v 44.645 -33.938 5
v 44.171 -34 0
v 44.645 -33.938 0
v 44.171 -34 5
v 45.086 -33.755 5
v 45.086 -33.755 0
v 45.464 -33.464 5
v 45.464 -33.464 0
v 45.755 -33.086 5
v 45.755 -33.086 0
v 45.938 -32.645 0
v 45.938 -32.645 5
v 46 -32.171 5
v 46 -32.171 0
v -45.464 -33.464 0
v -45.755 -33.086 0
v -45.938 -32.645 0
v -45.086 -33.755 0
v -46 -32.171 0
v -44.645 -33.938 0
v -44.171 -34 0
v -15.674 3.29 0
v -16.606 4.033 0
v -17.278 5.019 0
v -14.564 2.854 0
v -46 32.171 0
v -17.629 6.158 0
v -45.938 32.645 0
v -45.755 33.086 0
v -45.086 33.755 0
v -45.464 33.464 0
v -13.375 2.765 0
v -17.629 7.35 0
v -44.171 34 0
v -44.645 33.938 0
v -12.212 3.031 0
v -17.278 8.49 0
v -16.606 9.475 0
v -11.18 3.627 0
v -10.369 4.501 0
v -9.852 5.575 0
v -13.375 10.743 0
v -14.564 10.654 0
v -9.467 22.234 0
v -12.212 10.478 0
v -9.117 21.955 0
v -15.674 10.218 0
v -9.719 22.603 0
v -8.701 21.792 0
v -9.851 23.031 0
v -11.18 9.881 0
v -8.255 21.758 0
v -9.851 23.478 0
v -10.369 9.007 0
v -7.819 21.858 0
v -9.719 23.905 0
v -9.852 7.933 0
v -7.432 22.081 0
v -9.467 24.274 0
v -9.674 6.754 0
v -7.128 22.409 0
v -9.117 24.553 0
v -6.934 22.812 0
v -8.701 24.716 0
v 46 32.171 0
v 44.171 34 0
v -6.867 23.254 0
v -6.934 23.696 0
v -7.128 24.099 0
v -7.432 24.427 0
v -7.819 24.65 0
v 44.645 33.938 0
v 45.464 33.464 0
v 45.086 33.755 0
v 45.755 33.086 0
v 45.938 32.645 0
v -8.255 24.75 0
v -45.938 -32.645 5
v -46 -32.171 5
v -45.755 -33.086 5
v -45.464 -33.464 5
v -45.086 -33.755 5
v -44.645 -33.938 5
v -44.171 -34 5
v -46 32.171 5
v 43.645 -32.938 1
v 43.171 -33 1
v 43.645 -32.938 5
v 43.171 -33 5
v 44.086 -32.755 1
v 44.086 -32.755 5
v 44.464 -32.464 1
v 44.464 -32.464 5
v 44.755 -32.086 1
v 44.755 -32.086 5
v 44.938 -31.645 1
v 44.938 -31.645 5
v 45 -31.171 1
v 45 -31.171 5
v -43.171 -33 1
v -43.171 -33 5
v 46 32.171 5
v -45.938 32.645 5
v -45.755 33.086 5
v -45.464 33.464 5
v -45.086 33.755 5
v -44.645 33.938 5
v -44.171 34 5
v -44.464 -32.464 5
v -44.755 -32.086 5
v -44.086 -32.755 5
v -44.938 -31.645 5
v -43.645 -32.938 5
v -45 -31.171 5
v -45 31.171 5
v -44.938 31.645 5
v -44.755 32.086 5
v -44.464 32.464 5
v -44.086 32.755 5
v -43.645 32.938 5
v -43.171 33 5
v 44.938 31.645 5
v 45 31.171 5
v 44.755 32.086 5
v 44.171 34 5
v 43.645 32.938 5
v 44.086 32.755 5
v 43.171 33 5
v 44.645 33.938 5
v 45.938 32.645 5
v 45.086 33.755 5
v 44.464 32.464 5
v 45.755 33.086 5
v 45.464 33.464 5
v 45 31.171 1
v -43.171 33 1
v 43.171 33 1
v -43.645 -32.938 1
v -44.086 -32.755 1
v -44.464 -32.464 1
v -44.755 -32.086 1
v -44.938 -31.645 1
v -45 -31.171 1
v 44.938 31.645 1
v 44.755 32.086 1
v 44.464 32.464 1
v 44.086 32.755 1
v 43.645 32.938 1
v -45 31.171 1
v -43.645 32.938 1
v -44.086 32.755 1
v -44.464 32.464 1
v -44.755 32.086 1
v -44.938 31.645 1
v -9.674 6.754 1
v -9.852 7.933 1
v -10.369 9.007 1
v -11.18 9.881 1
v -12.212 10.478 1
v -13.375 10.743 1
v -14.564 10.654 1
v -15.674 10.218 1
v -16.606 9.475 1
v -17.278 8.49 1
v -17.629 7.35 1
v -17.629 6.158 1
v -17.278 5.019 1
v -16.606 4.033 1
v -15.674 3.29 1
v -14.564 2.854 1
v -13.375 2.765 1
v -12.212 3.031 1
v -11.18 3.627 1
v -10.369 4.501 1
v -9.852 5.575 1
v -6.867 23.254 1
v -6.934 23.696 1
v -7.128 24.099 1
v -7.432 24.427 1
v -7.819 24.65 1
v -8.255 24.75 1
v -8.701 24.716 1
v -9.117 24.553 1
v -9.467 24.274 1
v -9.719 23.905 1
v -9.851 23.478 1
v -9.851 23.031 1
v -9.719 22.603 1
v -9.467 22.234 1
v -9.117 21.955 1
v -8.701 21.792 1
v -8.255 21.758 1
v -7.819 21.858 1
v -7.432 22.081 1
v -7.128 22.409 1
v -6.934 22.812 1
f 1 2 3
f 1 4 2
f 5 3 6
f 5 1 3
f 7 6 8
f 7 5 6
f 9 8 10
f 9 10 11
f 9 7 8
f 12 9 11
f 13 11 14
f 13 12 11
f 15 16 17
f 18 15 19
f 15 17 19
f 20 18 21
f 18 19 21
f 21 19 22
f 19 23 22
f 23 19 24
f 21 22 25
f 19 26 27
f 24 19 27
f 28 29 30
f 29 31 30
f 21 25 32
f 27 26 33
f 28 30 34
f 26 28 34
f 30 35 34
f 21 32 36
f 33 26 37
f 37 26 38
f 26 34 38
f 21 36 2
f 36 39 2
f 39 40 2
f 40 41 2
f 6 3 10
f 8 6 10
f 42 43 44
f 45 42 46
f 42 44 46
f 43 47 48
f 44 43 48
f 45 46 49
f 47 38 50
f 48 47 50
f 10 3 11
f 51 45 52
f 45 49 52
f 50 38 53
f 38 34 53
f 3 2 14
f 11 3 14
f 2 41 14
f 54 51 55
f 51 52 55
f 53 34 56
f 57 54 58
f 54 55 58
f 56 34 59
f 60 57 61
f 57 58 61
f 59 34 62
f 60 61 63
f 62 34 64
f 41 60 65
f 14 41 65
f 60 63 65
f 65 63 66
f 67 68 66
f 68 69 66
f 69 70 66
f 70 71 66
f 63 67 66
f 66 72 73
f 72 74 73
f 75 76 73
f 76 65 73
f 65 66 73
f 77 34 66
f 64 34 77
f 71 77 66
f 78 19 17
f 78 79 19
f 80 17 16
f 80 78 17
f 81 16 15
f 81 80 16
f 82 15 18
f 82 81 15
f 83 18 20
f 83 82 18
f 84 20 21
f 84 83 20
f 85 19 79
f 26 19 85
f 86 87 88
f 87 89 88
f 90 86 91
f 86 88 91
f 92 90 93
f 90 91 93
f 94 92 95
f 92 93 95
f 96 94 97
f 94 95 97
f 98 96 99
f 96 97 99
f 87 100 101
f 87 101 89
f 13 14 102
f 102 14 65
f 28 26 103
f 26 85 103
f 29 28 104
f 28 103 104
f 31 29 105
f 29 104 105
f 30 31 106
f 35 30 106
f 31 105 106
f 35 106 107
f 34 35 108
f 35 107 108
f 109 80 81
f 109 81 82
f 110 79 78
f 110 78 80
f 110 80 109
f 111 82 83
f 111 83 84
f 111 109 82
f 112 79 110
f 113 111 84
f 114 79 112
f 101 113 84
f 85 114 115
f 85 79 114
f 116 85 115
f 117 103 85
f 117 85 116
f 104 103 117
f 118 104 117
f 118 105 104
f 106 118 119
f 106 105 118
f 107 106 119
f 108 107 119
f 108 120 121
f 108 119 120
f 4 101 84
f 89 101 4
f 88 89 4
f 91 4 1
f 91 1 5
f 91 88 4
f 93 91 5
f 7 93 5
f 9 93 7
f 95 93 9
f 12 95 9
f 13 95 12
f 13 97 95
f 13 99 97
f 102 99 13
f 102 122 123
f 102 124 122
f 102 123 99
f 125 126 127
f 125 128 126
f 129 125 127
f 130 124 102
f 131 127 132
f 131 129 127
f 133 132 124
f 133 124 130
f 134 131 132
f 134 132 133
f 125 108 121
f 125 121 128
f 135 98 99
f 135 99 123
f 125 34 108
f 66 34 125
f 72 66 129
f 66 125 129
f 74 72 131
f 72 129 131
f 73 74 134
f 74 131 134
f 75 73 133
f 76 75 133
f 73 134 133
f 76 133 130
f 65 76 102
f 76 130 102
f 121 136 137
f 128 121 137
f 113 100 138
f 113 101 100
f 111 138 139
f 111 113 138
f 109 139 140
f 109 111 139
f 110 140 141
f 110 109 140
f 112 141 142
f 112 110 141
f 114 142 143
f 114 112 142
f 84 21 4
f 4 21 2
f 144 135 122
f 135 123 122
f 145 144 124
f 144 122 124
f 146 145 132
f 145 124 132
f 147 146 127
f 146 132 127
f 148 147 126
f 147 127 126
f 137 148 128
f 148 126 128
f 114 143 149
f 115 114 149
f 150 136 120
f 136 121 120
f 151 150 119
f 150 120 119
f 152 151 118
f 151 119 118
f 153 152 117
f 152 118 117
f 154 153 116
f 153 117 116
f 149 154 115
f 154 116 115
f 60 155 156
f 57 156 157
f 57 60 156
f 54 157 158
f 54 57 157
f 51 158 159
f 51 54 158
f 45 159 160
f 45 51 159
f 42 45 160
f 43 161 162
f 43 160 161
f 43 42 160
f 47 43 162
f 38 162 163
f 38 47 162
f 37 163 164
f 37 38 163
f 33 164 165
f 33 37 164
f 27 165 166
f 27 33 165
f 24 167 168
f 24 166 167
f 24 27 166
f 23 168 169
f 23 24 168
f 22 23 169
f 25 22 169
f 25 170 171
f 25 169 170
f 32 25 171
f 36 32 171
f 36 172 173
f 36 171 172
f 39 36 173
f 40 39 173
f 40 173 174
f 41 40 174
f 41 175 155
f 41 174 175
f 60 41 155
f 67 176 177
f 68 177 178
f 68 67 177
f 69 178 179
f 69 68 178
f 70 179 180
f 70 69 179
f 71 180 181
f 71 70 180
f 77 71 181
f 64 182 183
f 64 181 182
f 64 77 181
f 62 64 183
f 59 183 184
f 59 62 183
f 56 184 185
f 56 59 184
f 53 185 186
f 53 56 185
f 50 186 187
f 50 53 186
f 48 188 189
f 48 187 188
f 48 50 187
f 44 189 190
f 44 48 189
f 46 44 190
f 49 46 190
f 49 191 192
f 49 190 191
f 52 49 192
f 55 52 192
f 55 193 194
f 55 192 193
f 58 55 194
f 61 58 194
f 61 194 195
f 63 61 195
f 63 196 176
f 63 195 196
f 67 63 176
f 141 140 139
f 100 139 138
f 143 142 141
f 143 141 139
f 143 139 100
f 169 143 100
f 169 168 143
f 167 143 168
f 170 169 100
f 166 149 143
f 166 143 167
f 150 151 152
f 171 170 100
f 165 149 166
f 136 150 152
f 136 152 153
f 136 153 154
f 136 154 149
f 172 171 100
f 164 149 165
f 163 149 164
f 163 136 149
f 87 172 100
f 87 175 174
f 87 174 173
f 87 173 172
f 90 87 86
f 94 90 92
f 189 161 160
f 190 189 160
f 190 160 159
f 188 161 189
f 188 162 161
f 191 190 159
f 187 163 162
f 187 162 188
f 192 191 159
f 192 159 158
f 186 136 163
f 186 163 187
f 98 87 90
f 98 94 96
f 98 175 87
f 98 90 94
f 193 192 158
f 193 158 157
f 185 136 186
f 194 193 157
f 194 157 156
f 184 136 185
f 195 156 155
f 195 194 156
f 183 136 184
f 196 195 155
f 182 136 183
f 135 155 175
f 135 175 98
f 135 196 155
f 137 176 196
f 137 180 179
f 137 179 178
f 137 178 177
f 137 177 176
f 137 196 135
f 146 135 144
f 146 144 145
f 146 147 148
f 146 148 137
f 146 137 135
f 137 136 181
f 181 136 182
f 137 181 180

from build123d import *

# Parameters (mm, degrees)
F0_W     = 92
F0_H     = 68
F0_W_2   = 90
F0_H_2   = 66
F2_DEPTH = 5
F3_DEPTH = 1
F1_R     = 4
F1_R_2   = 1.5
F4_DEPTH = 2.54
F5_R     = 1.8288


with BuildPart() as f2:
    # F0 (on Top) → F2 (new body)
    with BuildSketch(Plane.XY):
        Rectangle(F0_W, F0_H)
        Rectangle(F0_W_2, F0_H_2, mode=Mode.SUBTRACT)
    extrude(amount=F2_DEPTH)

    # F0 (on Top) → F3 (join)
    with BuildSketch(Plane.XY):
        Rectangle(F0_W_2, F0_H_2)
    extrude(amount=F3_DEPTH)

    # F1 (on Top) → F4 (cut)
    with BuildSketch(Plane.XY):
        with Locations((-13.673795, 6.754091)):
            Circle(F1_R)
        with Locations((-8.367444, 23.254091)):
            Circle(F1_R_2)
    extrude(amount=F4_DEPTH, mode=Mode.SUBTRACT)

    # F5
    f5_edges = [f2.edges().sort_by_distance(p)[0] for p in [
        (-45, 33, 3),
        (45, 33, 3),
        (-45, -33, 3),
        (45, -33, 3),
        (46, -34, 2.5),
        (-46, -34, 2.5),
        (-46, 34, 2.5),
        (46, 34, 2.5),
    ]]
    fillet(f5_edges, radius=F5_R)


solid = f2.part
